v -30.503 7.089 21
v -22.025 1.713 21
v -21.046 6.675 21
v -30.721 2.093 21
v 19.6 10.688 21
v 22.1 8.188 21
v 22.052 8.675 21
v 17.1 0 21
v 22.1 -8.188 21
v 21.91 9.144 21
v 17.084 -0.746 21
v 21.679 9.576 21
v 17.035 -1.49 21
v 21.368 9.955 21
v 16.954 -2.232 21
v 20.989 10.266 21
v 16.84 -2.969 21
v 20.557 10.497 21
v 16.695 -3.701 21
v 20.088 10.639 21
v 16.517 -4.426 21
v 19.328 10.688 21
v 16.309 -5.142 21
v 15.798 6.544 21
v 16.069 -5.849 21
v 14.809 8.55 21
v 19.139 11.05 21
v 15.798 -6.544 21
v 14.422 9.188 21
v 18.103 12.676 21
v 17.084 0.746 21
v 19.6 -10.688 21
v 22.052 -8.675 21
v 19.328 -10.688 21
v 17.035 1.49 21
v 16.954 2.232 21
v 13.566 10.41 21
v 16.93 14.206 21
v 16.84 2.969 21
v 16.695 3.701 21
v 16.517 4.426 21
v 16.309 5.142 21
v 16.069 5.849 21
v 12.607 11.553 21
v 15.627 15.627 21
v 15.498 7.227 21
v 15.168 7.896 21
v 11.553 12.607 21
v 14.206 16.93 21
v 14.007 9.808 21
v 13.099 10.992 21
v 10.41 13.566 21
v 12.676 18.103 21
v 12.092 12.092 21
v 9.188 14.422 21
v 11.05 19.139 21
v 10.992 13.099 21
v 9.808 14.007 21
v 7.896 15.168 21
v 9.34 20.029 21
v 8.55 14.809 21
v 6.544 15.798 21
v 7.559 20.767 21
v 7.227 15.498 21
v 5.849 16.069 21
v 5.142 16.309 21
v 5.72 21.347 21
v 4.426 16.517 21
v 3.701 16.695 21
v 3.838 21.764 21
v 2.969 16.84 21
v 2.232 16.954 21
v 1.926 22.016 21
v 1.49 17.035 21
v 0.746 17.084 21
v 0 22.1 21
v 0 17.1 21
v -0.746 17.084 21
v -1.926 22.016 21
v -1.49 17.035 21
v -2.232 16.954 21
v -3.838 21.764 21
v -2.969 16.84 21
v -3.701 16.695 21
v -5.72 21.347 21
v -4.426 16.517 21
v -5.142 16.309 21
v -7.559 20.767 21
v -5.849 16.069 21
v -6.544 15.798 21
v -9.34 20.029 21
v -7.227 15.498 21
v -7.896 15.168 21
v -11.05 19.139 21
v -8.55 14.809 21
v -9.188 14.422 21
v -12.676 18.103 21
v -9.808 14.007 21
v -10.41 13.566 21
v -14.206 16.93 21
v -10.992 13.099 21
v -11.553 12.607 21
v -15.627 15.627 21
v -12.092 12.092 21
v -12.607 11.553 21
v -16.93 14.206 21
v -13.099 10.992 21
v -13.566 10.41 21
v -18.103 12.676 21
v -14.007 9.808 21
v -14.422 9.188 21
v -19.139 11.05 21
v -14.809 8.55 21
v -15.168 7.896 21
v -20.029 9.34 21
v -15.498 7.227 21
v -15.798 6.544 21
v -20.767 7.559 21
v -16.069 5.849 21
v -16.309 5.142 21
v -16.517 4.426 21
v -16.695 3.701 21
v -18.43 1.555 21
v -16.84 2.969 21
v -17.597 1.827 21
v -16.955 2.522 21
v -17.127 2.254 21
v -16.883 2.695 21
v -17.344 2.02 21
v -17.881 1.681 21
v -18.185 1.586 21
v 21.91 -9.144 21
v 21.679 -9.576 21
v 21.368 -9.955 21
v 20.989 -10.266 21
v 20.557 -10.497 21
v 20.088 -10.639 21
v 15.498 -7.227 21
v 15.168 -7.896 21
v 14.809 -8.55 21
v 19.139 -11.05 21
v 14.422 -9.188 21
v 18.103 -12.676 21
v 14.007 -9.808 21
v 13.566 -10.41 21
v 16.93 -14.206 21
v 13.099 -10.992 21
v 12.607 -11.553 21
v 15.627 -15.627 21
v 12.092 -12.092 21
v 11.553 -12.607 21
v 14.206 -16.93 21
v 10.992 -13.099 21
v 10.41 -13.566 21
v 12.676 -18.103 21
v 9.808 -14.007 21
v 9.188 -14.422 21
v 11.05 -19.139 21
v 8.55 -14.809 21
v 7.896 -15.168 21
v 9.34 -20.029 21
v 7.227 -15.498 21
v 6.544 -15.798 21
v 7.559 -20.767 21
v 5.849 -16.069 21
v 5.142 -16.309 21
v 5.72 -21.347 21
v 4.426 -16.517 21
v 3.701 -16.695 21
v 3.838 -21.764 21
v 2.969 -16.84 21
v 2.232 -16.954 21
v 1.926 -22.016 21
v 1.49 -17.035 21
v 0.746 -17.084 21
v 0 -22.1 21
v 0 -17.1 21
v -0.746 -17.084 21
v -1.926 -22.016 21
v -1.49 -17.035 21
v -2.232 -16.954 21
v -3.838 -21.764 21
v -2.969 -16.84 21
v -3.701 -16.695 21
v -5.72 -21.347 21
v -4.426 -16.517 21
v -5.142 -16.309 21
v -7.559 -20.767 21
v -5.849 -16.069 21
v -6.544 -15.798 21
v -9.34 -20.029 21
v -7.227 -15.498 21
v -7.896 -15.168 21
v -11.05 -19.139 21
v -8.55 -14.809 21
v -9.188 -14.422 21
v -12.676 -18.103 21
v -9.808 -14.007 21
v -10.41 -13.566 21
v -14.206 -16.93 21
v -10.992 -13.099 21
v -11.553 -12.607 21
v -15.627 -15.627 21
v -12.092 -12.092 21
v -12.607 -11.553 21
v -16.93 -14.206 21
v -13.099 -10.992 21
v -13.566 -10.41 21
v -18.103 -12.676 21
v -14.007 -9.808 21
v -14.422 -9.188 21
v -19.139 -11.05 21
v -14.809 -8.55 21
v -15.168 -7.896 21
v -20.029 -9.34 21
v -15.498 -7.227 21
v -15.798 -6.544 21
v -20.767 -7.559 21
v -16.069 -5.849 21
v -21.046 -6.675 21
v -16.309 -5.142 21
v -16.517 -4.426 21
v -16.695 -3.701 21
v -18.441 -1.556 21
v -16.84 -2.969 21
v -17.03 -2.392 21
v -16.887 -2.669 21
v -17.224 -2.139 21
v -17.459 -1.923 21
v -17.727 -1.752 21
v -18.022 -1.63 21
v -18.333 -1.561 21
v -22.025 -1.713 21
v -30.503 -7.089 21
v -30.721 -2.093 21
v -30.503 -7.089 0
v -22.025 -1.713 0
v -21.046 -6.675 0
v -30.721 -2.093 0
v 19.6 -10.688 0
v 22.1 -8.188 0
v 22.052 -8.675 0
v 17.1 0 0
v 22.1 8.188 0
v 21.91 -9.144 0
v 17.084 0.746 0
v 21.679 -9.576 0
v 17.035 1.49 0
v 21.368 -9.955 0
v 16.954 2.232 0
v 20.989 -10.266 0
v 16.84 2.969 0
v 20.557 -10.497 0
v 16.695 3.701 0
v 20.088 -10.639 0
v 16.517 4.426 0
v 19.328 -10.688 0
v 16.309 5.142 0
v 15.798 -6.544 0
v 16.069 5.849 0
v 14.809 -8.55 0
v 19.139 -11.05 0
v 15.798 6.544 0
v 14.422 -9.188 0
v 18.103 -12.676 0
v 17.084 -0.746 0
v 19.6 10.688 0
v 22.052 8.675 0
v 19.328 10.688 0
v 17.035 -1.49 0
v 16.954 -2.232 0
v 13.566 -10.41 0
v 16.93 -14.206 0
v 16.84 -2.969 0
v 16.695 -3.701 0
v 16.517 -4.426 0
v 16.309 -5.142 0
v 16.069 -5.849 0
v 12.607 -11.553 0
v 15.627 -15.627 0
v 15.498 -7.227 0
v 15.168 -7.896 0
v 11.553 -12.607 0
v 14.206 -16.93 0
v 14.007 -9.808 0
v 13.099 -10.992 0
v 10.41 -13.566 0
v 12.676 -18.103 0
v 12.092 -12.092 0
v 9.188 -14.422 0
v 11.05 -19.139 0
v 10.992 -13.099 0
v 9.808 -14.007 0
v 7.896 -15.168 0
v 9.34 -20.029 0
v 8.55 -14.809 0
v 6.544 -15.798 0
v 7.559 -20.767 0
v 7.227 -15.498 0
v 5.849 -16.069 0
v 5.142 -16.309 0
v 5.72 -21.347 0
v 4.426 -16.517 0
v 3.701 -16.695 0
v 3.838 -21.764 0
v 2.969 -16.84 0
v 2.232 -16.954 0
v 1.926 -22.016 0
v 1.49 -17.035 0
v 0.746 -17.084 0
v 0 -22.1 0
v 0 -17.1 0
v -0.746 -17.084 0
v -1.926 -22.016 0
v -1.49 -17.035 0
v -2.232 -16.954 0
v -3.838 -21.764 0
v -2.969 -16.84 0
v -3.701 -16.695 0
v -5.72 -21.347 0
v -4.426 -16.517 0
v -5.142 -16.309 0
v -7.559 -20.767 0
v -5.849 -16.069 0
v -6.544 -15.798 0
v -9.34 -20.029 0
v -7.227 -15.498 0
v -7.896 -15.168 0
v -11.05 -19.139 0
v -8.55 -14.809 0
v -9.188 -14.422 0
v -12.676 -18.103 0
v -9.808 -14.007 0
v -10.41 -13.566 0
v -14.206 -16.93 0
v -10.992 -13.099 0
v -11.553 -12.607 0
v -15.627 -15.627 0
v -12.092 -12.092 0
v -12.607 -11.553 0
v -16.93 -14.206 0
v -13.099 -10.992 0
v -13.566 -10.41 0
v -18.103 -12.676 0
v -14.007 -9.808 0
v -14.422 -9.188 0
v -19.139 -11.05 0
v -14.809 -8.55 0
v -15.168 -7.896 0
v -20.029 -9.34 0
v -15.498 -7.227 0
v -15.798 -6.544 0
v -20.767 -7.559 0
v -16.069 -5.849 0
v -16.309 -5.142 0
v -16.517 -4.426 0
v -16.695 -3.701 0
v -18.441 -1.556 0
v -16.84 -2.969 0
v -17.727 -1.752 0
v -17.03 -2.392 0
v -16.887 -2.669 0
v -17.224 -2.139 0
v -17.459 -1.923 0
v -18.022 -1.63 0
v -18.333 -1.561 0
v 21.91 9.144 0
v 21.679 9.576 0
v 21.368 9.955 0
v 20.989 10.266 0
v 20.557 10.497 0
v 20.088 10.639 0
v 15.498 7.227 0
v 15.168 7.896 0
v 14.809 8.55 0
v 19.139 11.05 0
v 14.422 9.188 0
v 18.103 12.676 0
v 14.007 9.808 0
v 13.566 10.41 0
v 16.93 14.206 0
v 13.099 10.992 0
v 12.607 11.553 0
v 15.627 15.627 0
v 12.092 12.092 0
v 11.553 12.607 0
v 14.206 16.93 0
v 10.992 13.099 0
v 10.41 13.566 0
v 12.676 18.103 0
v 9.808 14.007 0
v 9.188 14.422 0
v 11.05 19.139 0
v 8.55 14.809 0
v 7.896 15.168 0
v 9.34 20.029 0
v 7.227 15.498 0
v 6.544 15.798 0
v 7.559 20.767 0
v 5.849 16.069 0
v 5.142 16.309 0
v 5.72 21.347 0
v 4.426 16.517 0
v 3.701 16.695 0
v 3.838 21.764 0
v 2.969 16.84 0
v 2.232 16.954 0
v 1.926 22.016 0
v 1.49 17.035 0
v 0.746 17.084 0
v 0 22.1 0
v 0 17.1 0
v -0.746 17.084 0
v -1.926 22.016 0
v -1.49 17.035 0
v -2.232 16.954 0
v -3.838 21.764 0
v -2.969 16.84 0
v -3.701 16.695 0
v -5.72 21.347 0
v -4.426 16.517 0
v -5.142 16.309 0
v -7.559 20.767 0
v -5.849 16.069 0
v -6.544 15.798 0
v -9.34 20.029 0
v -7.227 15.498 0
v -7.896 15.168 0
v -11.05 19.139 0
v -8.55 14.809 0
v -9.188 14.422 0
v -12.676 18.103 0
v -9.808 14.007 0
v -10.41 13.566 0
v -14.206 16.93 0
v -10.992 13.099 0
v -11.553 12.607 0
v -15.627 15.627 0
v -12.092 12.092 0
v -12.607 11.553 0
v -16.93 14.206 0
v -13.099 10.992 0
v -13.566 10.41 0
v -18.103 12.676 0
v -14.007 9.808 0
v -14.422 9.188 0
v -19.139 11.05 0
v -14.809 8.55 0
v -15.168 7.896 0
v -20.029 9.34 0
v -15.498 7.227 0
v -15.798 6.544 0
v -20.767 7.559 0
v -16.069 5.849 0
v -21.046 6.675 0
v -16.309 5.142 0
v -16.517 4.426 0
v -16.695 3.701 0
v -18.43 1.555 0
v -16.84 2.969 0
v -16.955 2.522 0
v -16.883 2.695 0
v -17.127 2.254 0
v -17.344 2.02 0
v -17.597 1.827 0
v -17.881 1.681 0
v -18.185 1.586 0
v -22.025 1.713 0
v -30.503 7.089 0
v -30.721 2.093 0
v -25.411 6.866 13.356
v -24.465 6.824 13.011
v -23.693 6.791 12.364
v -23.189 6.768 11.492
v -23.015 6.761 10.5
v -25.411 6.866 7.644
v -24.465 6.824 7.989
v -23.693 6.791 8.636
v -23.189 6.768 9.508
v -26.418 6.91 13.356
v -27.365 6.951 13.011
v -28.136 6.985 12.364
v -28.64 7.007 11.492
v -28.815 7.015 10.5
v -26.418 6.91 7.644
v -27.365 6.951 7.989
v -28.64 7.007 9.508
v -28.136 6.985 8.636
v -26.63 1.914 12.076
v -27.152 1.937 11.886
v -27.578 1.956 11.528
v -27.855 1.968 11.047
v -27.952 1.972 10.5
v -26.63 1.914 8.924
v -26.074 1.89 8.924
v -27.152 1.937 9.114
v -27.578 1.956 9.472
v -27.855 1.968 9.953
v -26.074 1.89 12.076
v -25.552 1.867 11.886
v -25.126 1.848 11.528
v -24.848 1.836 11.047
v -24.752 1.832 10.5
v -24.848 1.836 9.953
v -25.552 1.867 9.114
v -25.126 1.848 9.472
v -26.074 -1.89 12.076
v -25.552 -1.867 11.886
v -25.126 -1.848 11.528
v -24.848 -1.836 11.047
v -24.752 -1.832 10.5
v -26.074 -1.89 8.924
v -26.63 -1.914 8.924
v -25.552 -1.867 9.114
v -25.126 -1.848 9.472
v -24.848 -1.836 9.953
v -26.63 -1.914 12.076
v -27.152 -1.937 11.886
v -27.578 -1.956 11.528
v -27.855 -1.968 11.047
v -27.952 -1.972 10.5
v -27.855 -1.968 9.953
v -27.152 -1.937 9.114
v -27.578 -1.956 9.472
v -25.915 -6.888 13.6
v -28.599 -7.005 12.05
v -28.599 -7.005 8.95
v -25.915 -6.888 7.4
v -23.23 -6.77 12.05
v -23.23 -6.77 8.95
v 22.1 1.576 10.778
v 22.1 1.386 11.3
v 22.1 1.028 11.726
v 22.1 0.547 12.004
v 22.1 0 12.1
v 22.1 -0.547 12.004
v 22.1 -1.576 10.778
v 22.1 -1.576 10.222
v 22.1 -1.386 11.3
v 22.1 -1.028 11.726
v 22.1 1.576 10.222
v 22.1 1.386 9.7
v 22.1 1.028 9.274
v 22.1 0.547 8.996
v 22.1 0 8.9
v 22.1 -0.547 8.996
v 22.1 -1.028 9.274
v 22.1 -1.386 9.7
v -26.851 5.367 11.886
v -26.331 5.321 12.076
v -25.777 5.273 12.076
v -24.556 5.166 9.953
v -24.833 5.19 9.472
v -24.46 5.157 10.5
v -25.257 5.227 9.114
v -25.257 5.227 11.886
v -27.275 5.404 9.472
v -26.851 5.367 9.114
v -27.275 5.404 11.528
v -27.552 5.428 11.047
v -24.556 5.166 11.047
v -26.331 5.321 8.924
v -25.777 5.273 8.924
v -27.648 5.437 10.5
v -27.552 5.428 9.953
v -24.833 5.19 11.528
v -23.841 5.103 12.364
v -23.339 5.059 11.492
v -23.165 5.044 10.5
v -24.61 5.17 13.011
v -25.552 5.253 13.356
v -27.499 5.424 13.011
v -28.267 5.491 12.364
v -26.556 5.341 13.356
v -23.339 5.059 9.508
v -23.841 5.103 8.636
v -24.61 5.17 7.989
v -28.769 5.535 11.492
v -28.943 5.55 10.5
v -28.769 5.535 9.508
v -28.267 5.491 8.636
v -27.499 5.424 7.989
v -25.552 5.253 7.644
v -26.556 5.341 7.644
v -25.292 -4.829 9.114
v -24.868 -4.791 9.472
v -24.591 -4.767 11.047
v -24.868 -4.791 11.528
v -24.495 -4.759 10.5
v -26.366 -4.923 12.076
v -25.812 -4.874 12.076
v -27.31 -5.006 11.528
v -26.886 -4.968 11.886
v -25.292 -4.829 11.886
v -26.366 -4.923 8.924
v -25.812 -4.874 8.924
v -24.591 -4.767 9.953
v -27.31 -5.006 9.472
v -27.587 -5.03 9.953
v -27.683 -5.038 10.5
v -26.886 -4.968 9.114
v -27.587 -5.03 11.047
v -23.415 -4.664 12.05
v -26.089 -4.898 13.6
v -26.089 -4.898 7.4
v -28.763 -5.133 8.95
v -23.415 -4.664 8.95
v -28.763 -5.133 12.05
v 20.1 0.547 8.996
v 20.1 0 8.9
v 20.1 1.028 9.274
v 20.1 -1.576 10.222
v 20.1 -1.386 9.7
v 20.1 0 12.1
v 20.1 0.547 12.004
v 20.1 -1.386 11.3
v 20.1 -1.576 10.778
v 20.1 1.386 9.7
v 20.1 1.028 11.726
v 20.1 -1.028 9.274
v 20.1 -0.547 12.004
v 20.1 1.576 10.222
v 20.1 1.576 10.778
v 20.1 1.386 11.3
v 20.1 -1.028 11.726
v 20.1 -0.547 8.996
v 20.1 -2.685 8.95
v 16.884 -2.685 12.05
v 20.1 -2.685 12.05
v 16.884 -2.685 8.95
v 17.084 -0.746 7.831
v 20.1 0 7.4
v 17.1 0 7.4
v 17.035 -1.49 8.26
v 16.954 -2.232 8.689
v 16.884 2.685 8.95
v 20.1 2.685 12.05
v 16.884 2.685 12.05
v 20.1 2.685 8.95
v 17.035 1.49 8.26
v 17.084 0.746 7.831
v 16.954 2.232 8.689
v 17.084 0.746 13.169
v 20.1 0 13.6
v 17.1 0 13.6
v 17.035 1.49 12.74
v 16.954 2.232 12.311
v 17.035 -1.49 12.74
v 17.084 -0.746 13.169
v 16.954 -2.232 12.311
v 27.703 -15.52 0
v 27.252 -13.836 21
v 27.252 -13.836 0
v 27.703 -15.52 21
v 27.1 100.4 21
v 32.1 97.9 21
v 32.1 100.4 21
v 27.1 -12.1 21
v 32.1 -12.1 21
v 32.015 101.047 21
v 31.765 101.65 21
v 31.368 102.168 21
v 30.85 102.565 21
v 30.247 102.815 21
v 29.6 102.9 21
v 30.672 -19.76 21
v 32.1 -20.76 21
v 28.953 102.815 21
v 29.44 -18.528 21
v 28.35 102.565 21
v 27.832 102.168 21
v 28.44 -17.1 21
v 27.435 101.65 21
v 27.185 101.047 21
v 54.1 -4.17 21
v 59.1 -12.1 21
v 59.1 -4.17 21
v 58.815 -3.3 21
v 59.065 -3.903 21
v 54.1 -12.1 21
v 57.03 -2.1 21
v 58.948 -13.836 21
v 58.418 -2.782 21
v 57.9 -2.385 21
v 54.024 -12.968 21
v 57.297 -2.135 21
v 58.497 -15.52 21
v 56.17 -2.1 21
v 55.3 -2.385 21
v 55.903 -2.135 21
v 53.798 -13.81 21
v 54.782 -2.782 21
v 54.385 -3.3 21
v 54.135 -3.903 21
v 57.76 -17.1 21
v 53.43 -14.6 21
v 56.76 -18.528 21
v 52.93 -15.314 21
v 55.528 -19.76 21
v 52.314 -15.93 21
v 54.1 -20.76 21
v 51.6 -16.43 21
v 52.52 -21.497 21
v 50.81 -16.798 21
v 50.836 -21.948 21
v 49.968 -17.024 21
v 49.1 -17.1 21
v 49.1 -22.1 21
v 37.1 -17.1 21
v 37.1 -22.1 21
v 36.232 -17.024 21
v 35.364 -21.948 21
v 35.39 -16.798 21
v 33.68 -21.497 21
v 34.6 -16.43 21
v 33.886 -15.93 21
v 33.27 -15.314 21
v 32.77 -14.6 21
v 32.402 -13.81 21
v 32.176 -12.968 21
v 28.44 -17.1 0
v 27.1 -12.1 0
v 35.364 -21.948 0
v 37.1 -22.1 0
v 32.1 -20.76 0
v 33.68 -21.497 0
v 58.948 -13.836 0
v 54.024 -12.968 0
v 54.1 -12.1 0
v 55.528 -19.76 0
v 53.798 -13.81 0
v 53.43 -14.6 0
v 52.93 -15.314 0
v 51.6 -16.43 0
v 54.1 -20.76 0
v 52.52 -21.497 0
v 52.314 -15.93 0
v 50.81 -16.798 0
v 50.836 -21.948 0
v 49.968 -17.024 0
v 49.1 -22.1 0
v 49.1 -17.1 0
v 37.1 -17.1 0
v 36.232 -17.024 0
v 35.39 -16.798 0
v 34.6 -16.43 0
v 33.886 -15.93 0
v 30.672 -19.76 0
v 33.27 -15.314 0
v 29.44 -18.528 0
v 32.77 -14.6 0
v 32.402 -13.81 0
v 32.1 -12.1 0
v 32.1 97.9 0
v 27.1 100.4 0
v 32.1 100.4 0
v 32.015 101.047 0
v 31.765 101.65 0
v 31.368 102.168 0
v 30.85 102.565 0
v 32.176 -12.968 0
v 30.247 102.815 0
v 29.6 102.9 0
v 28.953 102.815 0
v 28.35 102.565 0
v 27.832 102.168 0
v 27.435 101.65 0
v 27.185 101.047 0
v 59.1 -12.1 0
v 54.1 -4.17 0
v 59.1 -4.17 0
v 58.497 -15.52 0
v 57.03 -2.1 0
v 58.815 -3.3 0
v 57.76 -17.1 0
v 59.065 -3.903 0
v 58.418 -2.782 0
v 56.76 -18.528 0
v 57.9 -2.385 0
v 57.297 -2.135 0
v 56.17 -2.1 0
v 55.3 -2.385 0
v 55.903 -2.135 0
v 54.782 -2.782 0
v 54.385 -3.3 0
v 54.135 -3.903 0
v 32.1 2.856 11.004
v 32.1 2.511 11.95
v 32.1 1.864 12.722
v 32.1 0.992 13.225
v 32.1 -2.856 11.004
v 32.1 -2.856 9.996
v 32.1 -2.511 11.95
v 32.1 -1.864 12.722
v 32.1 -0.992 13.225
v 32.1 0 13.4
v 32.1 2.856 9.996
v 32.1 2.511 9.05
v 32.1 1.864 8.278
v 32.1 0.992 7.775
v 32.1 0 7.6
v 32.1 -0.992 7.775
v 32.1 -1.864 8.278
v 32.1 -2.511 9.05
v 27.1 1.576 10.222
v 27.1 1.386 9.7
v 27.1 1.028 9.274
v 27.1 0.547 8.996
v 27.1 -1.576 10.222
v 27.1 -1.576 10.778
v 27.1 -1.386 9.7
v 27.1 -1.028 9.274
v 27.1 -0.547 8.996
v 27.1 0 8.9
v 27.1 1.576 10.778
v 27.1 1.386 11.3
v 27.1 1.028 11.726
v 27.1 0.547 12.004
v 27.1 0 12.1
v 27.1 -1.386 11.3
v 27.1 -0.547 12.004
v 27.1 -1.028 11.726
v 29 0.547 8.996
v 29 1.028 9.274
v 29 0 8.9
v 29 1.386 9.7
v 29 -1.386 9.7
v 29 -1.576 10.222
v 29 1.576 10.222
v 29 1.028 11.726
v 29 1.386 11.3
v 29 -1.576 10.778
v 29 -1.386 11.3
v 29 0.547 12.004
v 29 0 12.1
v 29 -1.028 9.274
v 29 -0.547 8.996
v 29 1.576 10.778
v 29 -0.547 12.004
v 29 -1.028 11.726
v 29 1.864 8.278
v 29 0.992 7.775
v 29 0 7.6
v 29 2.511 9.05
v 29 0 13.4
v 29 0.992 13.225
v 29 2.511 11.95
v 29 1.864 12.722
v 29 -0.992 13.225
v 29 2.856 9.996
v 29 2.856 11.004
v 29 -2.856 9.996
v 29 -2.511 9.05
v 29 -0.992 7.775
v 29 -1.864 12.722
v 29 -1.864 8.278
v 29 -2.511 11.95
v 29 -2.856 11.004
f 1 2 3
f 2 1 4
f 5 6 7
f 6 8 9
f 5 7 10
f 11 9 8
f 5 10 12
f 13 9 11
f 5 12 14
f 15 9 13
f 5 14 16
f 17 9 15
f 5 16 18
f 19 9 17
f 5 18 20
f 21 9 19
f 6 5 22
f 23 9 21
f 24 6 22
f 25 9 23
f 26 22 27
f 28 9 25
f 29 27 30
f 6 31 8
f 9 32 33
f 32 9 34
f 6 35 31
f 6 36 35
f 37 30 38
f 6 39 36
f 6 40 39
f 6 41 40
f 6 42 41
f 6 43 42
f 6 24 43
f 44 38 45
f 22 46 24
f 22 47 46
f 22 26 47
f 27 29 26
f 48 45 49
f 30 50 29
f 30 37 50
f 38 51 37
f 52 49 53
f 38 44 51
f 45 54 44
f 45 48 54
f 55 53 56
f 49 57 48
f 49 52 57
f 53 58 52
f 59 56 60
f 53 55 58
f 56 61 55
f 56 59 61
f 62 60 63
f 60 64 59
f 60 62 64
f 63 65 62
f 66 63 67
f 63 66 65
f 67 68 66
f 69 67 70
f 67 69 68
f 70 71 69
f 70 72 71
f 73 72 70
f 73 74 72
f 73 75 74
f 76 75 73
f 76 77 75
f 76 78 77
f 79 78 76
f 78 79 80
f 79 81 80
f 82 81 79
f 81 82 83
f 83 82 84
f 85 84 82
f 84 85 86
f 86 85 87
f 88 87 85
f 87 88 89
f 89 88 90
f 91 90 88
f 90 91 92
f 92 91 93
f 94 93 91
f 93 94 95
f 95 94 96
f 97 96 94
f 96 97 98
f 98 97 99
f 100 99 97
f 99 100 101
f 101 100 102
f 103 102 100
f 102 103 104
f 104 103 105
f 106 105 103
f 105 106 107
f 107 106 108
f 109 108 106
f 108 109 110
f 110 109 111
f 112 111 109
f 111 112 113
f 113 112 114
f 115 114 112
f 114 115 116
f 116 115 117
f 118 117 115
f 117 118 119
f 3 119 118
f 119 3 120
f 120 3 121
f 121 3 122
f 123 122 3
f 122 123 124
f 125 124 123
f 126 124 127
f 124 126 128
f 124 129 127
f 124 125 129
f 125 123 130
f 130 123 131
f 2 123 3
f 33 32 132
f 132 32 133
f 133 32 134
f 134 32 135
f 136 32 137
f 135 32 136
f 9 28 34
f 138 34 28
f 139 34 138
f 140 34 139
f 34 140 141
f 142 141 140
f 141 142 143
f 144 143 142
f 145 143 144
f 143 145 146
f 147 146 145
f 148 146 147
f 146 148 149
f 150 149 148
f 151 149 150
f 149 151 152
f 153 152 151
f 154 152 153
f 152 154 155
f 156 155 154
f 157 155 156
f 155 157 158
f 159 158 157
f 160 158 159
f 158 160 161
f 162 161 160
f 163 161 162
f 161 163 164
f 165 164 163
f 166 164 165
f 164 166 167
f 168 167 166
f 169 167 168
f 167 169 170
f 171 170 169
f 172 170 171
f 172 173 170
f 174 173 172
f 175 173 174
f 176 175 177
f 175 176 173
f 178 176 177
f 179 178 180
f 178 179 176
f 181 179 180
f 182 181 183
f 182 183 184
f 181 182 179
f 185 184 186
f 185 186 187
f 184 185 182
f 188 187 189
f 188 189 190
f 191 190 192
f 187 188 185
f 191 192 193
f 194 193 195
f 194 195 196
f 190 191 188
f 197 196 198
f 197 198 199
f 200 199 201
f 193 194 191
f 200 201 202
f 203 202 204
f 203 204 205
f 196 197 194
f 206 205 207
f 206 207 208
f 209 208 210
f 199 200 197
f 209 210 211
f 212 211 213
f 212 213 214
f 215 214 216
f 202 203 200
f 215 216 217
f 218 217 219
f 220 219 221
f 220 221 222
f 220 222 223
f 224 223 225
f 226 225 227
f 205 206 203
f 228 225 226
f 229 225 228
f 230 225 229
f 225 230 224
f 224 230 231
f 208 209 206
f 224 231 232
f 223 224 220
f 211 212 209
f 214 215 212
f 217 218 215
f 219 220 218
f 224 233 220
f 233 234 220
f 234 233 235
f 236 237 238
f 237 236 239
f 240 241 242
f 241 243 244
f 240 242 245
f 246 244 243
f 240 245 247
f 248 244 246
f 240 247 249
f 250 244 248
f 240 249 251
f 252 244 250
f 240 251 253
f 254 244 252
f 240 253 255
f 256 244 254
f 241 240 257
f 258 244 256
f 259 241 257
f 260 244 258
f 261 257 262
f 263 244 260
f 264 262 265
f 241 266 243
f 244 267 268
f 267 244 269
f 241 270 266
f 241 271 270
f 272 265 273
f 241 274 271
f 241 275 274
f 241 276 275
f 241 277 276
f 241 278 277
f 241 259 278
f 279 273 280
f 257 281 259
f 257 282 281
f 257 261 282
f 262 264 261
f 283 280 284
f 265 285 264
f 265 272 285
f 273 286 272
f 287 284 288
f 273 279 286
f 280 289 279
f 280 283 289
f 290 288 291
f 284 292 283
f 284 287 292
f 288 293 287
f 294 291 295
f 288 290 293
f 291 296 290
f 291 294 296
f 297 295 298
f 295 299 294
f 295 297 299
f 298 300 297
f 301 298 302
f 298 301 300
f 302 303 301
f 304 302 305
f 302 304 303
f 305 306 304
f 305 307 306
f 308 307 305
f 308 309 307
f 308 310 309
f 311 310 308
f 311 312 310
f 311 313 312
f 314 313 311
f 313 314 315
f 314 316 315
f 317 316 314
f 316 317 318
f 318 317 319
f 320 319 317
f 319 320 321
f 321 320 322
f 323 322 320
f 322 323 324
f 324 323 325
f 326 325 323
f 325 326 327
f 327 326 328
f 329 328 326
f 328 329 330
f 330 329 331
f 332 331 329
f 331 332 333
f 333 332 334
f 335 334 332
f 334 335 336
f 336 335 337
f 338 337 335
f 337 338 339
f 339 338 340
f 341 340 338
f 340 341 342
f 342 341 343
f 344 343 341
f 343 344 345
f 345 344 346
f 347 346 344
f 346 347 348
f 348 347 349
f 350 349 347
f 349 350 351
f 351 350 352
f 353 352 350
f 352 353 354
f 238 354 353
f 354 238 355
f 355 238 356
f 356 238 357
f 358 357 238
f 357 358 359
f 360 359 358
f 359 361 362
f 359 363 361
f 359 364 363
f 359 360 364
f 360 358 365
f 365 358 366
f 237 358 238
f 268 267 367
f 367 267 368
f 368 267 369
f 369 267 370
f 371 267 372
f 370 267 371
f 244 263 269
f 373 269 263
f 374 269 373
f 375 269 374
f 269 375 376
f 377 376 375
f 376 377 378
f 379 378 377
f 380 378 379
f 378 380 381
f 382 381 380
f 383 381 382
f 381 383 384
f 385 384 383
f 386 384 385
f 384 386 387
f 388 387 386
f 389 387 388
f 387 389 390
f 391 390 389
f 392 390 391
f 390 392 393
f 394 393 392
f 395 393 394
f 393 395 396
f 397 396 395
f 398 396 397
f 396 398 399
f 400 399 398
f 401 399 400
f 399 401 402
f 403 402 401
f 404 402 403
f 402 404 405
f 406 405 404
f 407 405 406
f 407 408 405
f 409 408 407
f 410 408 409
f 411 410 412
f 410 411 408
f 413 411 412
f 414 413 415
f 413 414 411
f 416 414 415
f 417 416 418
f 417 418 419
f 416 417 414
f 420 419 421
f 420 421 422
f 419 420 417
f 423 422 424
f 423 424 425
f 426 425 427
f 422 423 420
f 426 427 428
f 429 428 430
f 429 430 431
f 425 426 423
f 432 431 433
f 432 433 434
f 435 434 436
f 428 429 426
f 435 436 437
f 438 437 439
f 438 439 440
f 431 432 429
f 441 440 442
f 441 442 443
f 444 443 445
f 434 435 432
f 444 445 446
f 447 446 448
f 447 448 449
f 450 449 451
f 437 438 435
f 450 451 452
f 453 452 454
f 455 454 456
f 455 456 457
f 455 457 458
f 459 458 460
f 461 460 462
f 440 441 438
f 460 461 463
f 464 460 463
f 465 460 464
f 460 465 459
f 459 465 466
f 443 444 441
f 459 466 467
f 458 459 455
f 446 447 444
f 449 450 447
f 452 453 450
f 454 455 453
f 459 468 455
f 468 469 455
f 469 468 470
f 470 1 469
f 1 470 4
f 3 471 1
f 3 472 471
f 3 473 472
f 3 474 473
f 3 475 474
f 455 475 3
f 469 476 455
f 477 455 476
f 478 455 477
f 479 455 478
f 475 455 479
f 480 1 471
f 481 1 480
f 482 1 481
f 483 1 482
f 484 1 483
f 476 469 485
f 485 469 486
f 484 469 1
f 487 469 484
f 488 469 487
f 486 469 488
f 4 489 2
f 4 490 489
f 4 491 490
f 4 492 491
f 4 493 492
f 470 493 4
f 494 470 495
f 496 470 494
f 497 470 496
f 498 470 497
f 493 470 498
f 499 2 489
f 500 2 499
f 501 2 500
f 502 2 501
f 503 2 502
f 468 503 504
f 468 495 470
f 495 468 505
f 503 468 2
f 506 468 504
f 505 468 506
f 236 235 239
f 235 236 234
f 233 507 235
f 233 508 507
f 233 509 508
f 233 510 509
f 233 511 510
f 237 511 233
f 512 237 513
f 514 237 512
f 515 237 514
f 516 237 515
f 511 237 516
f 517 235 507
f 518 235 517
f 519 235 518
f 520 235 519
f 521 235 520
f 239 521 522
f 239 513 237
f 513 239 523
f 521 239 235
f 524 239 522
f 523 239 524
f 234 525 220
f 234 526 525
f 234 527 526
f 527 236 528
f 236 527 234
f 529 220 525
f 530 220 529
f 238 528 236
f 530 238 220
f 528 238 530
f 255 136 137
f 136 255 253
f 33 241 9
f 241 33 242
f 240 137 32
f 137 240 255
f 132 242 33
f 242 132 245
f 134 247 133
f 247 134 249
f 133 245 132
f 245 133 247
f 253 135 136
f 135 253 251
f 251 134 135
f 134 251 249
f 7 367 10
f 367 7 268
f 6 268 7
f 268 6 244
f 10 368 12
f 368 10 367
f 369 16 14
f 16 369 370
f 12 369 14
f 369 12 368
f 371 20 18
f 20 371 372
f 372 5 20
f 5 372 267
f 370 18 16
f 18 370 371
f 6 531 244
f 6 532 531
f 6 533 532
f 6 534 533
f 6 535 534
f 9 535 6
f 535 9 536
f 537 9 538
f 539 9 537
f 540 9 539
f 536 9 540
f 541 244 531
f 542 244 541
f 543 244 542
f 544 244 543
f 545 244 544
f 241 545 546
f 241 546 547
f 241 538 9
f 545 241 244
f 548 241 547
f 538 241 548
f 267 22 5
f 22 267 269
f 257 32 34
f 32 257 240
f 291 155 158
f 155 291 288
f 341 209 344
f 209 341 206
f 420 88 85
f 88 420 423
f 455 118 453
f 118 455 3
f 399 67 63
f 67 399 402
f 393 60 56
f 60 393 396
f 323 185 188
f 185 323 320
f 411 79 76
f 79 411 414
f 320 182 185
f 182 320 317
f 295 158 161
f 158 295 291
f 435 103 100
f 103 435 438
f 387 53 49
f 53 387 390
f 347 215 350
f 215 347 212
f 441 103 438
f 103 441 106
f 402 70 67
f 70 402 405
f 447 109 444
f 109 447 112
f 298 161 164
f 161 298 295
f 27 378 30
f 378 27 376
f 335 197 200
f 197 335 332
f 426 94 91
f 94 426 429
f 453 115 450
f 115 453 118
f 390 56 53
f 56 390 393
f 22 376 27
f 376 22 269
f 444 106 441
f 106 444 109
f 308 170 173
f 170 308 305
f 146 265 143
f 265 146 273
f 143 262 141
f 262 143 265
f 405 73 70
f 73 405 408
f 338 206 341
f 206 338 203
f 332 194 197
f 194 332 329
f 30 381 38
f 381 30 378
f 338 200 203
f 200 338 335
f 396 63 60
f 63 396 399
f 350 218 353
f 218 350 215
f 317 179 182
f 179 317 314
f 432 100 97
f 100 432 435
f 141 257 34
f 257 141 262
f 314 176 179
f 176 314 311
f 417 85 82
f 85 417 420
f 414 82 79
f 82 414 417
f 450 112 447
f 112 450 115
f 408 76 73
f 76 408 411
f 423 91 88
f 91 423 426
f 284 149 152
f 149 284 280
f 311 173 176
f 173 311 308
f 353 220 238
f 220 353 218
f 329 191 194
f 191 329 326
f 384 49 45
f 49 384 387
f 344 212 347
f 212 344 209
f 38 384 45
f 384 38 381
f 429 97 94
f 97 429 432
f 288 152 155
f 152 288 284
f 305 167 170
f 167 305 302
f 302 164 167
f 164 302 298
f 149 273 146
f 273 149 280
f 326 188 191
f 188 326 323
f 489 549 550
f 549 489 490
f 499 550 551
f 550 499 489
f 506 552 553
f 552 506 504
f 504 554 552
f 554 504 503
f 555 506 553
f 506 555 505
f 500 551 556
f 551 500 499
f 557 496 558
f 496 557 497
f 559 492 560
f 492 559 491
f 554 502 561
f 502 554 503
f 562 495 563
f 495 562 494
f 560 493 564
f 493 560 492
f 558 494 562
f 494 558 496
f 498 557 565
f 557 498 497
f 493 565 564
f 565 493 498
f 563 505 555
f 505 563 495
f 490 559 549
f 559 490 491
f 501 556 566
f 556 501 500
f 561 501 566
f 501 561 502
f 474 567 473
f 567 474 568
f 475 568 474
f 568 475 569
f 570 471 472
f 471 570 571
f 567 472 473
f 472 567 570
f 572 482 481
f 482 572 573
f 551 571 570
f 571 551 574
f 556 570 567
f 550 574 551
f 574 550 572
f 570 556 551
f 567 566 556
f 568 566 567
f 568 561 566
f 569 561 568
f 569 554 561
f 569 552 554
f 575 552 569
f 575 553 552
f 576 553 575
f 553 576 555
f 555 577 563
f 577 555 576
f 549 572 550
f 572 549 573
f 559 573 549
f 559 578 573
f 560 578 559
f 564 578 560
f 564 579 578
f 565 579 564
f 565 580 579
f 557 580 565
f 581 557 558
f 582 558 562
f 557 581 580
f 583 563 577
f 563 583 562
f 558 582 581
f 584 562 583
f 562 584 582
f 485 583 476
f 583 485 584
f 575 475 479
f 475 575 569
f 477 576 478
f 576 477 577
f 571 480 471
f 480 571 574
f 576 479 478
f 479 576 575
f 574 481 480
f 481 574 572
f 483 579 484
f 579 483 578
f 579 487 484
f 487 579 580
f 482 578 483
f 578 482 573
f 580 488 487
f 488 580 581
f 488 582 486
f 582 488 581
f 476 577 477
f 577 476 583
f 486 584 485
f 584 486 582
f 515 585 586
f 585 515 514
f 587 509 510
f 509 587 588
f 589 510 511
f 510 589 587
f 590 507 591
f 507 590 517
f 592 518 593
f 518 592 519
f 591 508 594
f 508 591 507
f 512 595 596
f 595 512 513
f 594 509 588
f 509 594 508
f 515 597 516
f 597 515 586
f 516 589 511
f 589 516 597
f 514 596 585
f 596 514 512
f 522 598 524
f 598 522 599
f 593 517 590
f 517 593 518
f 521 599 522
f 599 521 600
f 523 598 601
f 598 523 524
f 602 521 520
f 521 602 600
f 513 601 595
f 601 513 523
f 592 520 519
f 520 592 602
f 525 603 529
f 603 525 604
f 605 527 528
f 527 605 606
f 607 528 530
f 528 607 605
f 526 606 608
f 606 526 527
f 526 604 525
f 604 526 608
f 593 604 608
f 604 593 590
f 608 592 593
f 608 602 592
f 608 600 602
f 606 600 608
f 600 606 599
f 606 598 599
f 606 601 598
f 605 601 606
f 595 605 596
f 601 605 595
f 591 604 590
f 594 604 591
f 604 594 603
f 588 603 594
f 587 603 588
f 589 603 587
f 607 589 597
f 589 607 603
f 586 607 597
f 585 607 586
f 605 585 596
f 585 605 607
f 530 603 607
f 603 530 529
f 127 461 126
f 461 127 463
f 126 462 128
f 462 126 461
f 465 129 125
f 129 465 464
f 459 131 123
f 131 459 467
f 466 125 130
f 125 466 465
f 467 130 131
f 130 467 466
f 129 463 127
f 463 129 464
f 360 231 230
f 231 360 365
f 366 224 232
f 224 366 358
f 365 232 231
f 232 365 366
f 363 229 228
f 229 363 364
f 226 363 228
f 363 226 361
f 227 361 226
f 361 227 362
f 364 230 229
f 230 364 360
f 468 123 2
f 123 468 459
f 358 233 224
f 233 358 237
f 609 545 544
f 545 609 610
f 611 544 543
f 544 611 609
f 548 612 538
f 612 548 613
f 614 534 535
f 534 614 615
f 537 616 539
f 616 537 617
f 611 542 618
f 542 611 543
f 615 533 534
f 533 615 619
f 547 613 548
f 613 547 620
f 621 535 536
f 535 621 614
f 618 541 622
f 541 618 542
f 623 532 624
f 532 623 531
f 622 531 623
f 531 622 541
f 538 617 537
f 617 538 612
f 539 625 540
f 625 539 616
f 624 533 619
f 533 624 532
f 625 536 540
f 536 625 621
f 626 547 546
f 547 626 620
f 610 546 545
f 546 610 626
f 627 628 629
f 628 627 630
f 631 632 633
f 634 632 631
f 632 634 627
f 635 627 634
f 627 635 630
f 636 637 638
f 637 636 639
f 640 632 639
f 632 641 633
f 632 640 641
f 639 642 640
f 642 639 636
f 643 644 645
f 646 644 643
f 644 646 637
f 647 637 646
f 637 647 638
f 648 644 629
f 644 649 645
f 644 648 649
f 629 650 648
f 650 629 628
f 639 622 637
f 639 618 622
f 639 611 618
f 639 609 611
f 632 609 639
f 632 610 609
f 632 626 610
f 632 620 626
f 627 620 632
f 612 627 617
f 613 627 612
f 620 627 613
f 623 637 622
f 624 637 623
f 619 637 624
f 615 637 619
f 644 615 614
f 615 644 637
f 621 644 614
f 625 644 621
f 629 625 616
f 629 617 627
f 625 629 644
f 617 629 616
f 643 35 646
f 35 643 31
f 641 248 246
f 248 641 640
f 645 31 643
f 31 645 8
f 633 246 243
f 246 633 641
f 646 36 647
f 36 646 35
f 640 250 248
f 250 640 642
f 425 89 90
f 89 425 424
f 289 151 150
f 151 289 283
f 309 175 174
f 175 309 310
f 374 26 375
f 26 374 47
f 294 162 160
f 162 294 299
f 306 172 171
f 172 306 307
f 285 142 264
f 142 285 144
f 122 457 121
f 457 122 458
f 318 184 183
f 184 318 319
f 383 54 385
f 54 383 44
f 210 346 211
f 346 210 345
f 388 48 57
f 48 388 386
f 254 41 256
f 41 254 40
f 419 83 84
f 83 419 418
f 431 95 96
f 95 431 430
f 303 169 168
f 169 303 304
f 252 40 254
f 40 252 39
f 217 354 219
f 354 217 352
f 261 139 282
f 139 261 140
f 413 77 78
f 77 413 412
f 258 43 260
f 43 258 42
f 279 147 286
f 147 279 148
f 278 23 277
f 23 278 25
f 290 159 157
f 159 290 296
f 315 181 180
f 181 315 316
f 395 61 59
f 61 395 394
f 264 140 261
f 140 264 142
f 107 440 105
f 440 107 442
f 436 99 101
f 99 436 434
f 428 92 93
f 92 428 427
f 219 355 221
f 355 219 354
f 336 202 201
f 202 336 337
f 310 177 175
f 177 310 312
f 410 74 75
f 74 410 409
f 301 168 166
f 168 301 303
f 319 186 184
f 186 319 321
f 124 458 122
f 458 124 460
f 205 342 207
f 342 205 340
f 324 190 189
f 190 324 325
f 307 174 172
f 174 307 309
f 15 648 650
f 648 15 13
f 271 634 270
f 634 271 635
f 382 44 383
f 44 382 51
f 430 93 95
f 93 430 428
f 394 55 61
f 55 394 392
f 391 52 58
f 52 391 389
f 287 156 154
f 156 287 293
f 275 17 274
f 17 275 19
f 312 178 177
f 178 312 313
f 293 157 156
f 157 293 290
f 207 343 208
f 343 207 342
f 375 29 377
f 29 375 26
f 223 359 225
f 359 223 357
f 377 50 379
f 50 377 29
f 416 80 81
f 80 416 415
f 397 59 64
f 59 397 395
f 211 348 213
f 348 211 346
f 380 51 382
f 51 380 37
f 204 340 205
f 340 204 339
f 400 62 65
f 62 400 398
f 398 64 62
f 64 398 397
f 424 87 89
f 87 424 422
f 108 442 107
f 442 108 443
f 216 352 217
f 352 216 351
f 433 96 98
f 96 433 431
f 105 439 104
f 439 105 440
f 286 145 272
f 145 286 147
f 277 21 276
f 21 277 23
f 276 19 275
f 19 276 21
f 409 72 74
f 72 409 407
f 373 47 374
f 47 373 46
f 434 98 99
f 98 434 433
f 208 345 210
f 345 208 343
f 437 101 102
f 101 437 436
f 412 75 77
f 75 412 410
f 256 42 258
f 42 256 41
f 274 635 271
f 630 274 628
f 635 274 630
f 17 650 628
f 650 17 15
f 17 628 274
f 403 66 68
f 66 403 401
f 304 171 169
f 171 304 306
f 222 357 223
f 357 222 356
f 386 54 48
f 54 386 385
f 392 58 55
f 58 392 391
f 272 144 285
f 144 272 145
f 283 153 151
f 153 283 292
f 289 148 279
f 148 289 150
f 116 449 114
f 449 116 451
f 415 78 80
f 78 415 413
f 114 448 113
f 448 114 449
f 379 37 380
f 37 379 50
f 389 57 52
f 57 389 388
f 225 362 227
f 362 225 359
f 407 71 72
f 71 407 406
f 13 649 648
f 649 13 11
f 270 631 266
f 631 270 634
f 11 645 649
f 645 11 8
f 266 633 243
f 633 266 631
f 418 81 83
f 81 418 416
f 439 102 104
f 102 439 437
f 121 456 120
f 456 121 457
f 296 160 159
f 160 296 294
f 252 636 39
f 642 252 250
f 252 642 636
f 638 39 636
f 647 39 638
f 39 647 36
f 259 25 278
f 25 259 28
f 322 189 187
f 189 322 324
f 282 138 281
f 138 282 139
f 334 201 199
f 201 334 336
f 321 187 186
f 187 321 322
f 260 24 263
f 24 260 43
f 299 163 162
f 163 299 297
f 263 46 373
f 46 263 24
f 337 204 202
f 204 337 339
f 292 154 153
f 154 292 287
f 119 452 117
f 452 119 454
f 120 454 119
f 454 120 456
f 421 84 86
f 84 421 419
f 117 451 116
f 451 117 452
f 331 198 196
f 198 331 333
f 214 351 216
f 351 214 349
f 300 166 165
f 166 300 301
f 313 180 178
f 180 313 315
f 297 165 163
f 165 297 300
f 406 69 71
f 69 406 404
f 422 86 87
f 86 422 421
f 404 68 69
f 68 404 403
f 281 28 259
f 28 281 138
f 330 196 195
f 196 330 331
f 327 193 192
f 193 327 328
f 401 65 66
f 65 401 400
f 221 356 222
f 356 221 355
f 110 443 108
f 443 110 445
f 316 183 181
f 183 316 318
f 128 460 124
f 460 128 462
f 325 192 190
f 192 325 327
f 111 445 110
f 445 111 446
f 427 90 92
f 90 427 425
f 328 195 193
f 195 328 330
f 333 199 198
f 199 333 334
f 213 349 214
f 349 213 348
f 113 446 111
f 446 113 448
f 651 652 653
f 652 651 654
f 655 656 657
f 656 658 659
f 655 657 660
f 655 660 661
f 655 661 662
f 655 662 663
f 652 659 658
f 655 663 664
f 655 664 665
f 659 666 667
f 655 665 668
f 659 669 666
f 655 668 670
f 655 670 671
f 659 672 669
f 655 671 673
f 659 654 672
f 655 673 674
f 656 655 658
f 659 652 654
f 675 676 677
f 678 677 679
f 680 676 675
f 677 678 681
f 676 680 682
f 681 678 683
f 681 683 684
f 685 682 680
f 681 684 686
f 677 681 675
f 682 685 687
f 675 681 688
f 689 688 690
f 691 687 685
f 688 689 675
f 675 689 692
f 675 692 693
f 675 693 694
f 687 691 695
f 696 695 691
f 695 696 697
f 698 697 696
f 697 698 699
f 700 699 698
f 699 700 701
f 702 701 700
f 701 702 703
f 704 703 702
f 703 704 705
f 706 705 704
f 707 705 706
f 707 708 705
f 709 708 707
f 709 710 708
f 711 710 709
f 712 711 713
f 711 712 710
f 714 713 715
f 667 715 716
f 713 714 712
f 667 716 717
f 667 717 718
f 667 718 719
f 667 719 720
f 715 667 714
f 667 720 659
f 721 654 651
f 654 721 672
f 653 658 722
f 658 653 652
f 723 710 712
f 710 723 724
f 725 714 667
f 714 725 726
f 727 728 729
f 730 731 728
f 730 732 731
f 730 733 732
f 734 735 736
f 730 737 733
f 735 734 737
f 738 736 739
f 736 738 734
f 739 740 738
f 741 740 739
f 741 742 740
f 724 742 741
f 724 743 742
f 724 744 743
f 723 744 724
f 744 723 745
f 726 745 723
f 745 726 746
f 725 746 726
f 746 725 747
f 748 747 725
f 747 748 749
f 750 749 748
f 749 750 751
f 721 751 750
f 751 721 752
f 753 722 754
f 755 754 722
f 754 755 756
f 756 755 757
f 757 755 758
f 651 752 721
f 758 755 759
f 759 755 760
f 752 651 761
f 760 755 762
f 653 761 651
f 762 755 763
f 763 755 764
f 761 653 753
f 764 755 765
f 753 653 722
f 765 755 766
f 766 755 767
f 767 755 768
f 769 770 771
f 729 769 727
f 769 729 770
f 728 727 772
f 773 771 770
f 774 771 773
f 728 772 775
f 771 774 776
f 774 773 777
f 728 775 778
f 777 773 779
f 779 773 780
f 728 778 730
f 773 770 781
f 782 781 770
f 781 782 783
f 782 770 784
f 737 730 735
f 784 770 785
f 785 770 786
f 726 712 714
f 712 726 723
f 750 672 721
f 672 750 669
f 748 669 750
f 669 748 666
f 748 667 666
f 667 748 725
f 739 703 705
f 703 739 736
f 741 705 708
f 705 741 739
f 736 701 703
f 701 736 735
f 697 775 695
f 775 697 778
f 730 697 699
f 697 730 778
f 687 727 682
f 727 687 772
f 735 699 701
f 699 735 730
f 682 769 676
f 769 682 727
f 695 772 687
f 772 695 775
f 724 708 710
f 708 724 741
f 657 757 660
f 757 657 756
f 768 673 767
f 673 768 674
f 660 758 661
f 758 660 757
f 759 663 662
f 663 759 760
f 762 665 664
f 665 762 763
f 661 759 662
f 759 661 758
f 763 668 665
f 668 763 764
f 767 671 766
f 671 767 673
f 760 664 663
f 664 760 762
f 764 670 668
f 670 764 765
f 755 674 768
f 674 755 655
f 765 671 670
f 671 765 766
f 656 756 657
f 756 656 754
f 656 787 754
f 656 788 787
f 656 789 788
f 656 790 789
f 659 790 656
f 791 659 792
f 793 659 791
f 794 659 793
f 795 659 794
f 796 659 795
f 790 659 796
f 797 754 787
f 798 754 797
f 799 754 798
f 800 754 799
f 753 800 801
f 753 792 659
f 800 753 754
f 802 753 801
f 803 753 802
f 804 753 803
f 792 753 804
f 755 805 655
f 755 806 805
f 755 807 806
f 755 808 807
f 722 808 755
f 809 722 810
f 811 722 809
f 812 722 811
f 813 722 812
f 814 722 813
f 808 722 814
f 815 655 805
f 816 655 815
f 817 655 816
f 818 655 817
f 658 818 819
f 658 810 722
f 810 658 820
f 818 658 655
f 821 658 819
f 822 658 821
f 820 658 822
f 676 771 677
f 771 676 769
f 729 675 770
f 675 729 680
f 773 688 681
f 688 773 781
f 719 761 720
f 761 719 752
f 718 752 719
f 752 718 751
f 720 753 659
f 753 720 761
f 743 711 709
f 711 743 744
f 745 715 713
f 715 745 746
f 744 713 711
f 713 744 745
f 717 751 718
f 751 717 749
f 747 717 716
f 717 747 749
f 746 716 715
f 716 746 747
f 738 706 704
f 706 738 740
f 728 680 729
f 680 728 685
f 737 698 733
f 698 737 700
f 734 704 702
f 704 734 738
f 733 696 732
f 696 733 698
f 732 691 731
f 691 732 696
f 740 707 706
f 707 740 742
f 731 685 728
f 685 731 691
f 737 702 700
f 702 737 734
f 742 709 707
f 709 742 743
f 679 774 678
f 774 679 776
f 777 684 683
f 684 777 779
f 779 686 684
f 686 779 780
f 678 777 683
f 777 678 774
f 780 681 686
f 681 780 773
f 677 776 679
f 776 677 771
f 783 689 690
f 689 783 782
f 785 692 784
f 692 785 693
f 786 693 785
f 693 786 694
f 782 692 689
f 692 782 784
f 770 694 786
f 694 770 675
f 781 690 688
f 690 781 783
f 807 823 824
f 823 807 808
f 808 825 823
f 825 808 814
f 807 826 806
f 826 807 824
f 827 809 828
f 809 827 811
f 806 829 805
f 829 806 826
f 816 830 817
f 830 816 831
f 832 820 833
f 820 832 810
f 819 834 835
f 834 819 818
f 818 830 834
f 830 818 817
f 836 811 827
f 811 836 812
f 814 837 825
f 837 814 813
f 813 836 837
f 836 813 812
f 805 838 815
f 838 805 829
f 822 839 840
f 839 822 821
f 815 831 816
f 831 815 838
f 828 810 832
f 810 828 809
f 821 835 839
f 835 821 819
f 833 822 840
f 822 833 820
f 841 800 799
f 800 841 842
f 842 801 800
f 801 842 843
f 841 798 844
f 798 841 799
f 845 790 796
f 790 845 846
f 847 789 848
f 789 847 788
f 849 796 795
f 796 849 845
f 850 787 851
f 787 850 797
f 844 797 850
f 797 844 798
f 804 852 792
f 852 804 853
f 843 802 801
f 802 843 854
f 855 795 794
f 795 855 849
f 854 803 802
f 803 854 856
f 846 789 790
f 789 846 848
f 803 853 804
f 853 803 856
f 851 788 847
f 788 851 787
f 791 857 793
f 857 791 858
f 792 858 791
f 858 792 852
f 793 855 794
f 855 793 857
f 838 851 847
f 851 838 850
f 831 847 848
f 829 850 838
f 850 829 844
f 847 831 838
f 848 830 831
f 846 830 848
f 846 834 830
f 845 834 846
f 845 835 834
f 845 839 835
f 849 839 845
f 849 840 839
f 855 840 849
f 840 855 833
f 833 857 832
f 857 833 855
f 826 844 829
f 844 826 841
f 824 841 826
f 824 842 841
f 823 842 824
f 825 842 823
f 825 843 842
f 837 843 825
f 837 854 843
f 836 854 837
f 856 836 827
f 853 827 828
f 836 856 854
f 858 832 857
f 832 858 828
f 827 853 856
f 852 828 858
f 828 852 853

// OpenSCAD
/**
 * (c) Spiros Papadimitriou, 2015
 *
 * This design is made available under a
 * Creative Commons Attribution Share-Alike license.
 * http://creativecommons.org/licenses/by-sa/3.0/
 * You can share and remix this work, provided that
 * you keep the attribution to the original author intact,
 * and that, f you alter, transform, or build upon
 * this work, you may distribute the resulting work
 * only under the same or similar license to this one.
 */

/* [Main parameters] */

part = "all"; // [all:All,clamp:Clamp,hook:Hook]


// Thickness of both pieces (at least 4, unless fastener parameters are tweaked)
thickness = 5;
// Width of both pieces
width = 21;

// Inner diameter of clamp piece; see also slack (advanced)
clamp_inner_diameter = 33.5;
// Distance between clamp tabs (measured at inner diameter); see also angle adjustment factor (advanced)
clamp_tab_gap = 3;

// Length of hook piece's back (at least clamp outer diameter)
hook_length = 120;
// Depth of hook piece
hook_depth = 22;
// Length of hook piece's front lip
hook_lip_length = 15;

// Offset of screw hole (relative to point that makes hook bottom flush with clamp ring bottom)
hook_screw_offset = 0;

/* [Advanced] */

// Added to inner radius (not diameter!); could have been incorporated into clamp diameter, but separate so user's don't forget some slack
clamp_slack = 0.35;
// Must be between 0 and 1, adjusts orientation of clamp tabs from parallel (1) to collinear to cutout (0); depending on tab gap and flexibility of material used, you may want to adjust this so the tabs are approximately parallel when the clamp is tightened (smaller gaps might require larger factor and vice versa)
clamp_tab_angle_adjustment_factor = 0.5;

// Main diameter of screw (default: M3)
screw_diameter = 3.2;
// Hex nut diameter (corner to corner)
screw_nut_diameter = 6;
// Hex nut thickness
screw_nut_height = 2.4;
// Screw head diameter (also determines clamp tab length)
screw_head_diameter = 5.5;
// Screw head thickness
screw_head_height = 3.1;

// Separate screw head thickness for clamp tab screw (where it's acceptable for head to protrude, so we can allow for thicker/stronger wall)
clamp_tab_screw_head_height = 2;
// Deepens hole for hex nut that attaches clamp to hook; if wall thickness is large enough, can be adjusted so a longer screw does not stick out into clamp when fully tightened
clamp_ring_screw_nut_extra_height = 0.6;


/* [Hidden] */

r = clamp_inner_diameter/2 + clamp_slack; //+ 0.75;
thk = thickness;
w = width;
l = hook_length;
d = hook_depth;
lip = hook_lip_length;

//screw_r = 3.2/2; // M3
//screw_nut_r = 6/2 + 0.1;  // M3
//screw_nut_h = 2.4;  // M3
//screw_nut_hadj = 0.6; // Extra sink adjustment for attachment nut
//screw_cap_r = 5.5/2 + 0.15; // M3
//screw_cap_sink = 2;  // only sink portion, not full
//screw_cap_h = 3.1;
screw_r = screw_diameter/2;
screw_nut_r = screw_nut_diameter/2 + 0.1;
screw_nut_h = screw_nut_height;
screw_nut_hadj = clamp_ring_screw_nut_extra_height; // Extra sink adjustment for attachment nut
screw_cap_r = screw_head_diameter/2 + 0.15;
screw_cap_sink = clamp_tab_screw_head_height;  // only sink portion, not full
screw_cap_h = screw_head_height;


clamp_radial = true;  // FIXME: Remove option, false is same as tab_angle_adj_factor == 1

clamp_gap = clamp_tab_gap;  // 2;                // (parallel)
clamp_angle = 2*atan(0.5*clamp_gap/r); // (radial)
clamp_angle_adj = clamp_tab_angle_adjustment_factor*clamp_angle;
clamp_l = 3*screw_cap_r;


//tilt = 40;  // degrees (outward => inward correction)

//include <util.scad>

/********************* include util.scad - begin ***************************/

module fillet(h, r) {
  difference() {
     cube([h, r, r]);
     translate([-0.1, r, r]) rotate([0, 90, 0]) cylinder(h = h+.2, r = r);
  }
}

module fillet_theta(h, r, theta) {
  rotate([90, 0, 90])
    difference() {
      linear_extrude(h)
        polygon([[0, 0], [r, 0], [r*cos(theta), r*sin(theta)]]);
      translate([r, r*tan(theta/2), -1])
        cylinder(r = r*tan(theta/2), h=h+2);
    }
}

module roundedCube4(dim, r, center=false) {
  width = dim[0];
  height = dim[1];
  depth = dim[2];
  centerx = (center[0] == undef ? center : center[0]);
  centery = (center[1] == undef ? center : center[1]);
  centerz = (center[2] == undef ? center : center[2]);
  translate([centerx ? -width/2 : 0, centery ? -height/2 : 0, centerz ? -depth/2 : 0]) union() {
    translate([0, r, 0]) cube([width, height-2*r, depth]);
    translate([r, 0, 0]) cube([width-2*r, height, depth]);
    for (xy = [[r, r],
               [r, height-r],
               [width-r, r],
               [width-r, height-r]]) {
      translate([xy[0], xy[1], 0]) cylinder(r = r, h = depth);
    }
  }
}

/********************** include util.scad - end ****************************/


module clamp() {
  clamp_theta = clamp_angle/2; // atan(clamp_gap/(2*r));
  clamp_dx = r*cos(clamp_theta);
  //clamp_fillet_dx = (clamp_dx+thk)*cos(atan(thk/(clamp_dx+thk)))-1.2;  // FIXME: -1.2 empirical
  difference() {
    union() {
      // Clamp ring
      cylinder(r = r+thk, h = w, $fn=72);
      
      // Clamp (radial)
      if (clamp_radial) {
        rotate([0, 0, -clamp_angle/2])
          translate([-r, 0, 0]) 
            rotate([0, 0, clamp_angle_adj/2])
              translate([-clamp_l-thk, 0, 0]) 
                cube([clamp_l+thk, thk, w]);
        rotate([0, 0, clamp_angle/2])
          translate([-r, 0, 0])
            rotate([0, 0, -clamp_angle_adj/2])
              translate([-clamp_l-thk, -thk, 0])
                cube([clamp_l+thk, thk, w]);
      }
        
      // Clamp (translation / parallel)
      if (!clamp_radial) {
        translate([-clamp_l-thk-clamp_dx, clamp_gap/2, 0])
          cube([clamp_l+thk, thk, w]);
        translate([-clamp_l-thk-clamp_dx, -thk-clamp_gap/2, 0])
          cube([clamp_l+thk, thk, w]);
        // TODO: Next two fillets cause non-manifold mesh
        //*translate([-clamp_fillet_dx, -clamp_gap/2-thk+0.05, 0])
        //  rotate([0, -90, 90])
        //    fillet_theta(r=thk/2, h=w, theta=90+clamp_angle/2, $fn=24);
        //*translate([-clamp_fillet_dx, clamp_gap/2+thk-0.05, 0])
        //  rotate([0, -90, -clamp_theta])
        //    fillet_theta(r=thk/2, h=w, theta=90+clamp_angle/2, $fn=24);
      }
      
      // Attachment shoulder
      roundedCube4([r+thk, 1.25*r, w], r=thk/2, center=[false, true, false], $fn=32);
    }
    
    // Ring negative
    translate([0, 0, -1]) 
      cylinder(r = r, h = w+2, $fn=36*4);

    // Clamp negative (radial)
    if (clamp_radial) {
      rr = thk + clamp_l + 1;
      translate([0, 0, -1]) linear_extrude(w+2)
        polygon([ [0, 0], 
                  [-r*cos(clamp_angle/2), -r*sin(clamp_angle/2)], 
                  [-r*cos(clamp_angle/2)-rr*cos((clamp_angle-clamp_angle_adj)/2), 
                   -r*sin(clamp_angle/2)-rr*sin((clamp_angle-clamp_angle_adj)/2)], 
                  [-r*cos(clamp_angle/2)-rr*cos((clamp_angle-clamp_angle_adj)/2), 
                    r*sin(clamp_angle/2)+rr*sin((clamp_angle-clamp_angle_adj)/2)],
                  [-r*cos(clamp_angle/2), r*sin(clamp_angle/2)] ]);
      
      // Screw/nut holes
      rotate([0, 0, -clamp_angle/2]) {
        translate([-r-thk-clamp_l/2+(r-clamp_dx)/2, -1, w/2])
          rotate([-90, 0, 0])
            cylinder(r=screw_r, h=thk+2, center=false, $fn=18);
        translate([-r-thk-clamp_l/2+(r-clamp_dx)/2, thk+1, w/2])
          rotate([90, 0, 0])
            cylinder(r=screw_cap_r, h=screw_cap_sink+1, $fn=18);
      }
      rotate([0, 0, clamp_angle/2]) {
        translate([-r-thk-clamp_l/2+(r-clamp_dx)/2, 1, w/2])
          rotate([90, 0, 0])
            cylinder(r=screw_r, h=thk+2, center=false, $fn=18);
        translate([-r-thk-clamp_l/2+(r-clamp_dx)/2, -thk-1, w/2])
          rotate([-90, 30, 0])
            cylinder(r=screw_nut_r, h=screw_nut_h+1, $fn=6);
      }
      
      //echo(clamp_angle/4);
      //echo(atan(thk/(3*r))/2);
      theta_slack = atan(thk/(3*r))/2; // Account for one side of the fillet being against curved (not straight) surface (the inner circle of the clamp)
      rotate([0, 0, -clamp_angle/2+0.05])
        translate([-r+0.05, 0, -1])
          rotate([0, -90, -clamp_angle/2+2*clamp_angle_adj/2-theta_slack])
            fillet_theta(r=thk/3, h=w+2, theta=90+clamp_angle/2-clamp_angle_adj/2+theta_slack, $fn=36);
      rotate([0, 0, clamp_angle/2-0.05])
        translate([-r+0.05, 0, -1])
          rotate([0, -90, 90-clamp_angle_adj/2+0])
            fillet_theta(r=thk/3, h=w+2, theta=90+clamp_angle/2-clamp_angle_adj/2+theta_slack, $fn=36);
    }
    
    // Clamp negative (translation / parallel)
    if (!clamp_radial) {
      translate([-r-thk-clamp_l-1, -clamp_gap/2, -1])
        cube([r+thk+clamp_l+1, clamp_gap, w+2]);
      translate([-r-thk-clamp_l/2+(r-clamp_dx)/2, 0, w/2])
        rotate([90, 0, 0])
          cylinder(r=screw_r, h=2*thk+clamp_gap+2, center=true, $fn=18);
      translate([-r-thk-clamp_l/2, 0, w/2])
        rotate([90, 0, 0])
          cylinder(r=screw_r, h=2*thk+clamp_gap+2, center=true, $fn=18);
      translate([-r-thk-clamp_l/2+(r-clamp_dx)/2, -clamp_gap/2-thk-1, w/2])
        rotate([-90, 0, 0])
          cylinder(r=screw_nut_r, h=screw_nut_h+1, $fn=6);
      translate([-r-thk-clamp_l/2+(r-clamp_dx)/2, clamp_gap/2+thk+1, w/2])
        rotate([90, 0, 0])
          cylinder(r=screw_cap_r, h=screw_cap_sink+1, $fn=18);
      translate([-clamp_dx+0.05, clamp_gap/2-0.05, -1])
        rotate([0, -90, -clamp_theta-1])
          fillet_theta(r=thk/3, h=w+2, theta=90+clamp_theta+1, $fn=24);
      translate([-clamp_dx+0.05, -clamp_gap/2+0.05, -1])
        rotate([0, -90, 90])
          fillet_theta(r=thk/3, h=w+2, theta=90+clamp_theta+1, $fn=20);
    }
        
    // Attachment screw/nut
    translate([0, 0, w/2])
      rotate([0, 90, 0]) {
        cylinder(r=screw_r, h=r+thk+1, $fn=18);
        cylinder(r=screw_nut_r, h=r+screw_nut_h+screw_nut_hadj, $fn=6);
      }
  }
}


module hook() {
  cr = min(thk, d/2);
  difference() {
    union() {
      // Hook
      translate([0, -r-thk, 0])
        roundedCube4([d+2*thk, 2*(thk+cr), w], r=cr+thk, $fn=36);
      translate([thk+d, -r+thk, 0])
        cube([thk, lip-thk, w]);

      // Backing
      translate([0, -r+thk, 0]) {
        // Half-rounded cube (only top)
        roundedCube4([thk, l-r+r-thk, w], r=thk/2, $fn=24);
        cube([thk, thk, w]);
      }
    }
    
    // Hook negative
    translate([thk, -r, -1])
      roundedCube4([d, l, w+2], r=cr, $fn=36);
    translate([thk+d-1, -r+lip, -1])
      cube([thk+2, r-lip+2*thk+1, w+2]);
    translate([2*thk+d+0.05, -r+lip+0.05, -1])
      rotate([0, -90, 90]) 
        fillet(r=thk/2, h=w+2, $fn=24);
    translate([thk+d-0.05, -r+lip+0.05, -1])
      rotate([0, -90, 180]) 
        fillet(r=thk/2, h=w+2, $fn=24);
    
    // Attachment screw
    translate([-1, hook_screw_offset, w/2])
      rotate([0, 90, 0]) {
        cylinder(r=screw_r, h=thk+2, $fn=18);
        translate([0, 0, thk+2-screw_cap_h-1])
          cylinder(r=screw_cap_r, h=screw_cap_h+1, $fn=18);
      }
  }
}

if (part == "all" || part == "clamp")
  clamp();
if (part == "all" || part == "hook")
  translate([r+2*thk, 0, 0]) hook();
